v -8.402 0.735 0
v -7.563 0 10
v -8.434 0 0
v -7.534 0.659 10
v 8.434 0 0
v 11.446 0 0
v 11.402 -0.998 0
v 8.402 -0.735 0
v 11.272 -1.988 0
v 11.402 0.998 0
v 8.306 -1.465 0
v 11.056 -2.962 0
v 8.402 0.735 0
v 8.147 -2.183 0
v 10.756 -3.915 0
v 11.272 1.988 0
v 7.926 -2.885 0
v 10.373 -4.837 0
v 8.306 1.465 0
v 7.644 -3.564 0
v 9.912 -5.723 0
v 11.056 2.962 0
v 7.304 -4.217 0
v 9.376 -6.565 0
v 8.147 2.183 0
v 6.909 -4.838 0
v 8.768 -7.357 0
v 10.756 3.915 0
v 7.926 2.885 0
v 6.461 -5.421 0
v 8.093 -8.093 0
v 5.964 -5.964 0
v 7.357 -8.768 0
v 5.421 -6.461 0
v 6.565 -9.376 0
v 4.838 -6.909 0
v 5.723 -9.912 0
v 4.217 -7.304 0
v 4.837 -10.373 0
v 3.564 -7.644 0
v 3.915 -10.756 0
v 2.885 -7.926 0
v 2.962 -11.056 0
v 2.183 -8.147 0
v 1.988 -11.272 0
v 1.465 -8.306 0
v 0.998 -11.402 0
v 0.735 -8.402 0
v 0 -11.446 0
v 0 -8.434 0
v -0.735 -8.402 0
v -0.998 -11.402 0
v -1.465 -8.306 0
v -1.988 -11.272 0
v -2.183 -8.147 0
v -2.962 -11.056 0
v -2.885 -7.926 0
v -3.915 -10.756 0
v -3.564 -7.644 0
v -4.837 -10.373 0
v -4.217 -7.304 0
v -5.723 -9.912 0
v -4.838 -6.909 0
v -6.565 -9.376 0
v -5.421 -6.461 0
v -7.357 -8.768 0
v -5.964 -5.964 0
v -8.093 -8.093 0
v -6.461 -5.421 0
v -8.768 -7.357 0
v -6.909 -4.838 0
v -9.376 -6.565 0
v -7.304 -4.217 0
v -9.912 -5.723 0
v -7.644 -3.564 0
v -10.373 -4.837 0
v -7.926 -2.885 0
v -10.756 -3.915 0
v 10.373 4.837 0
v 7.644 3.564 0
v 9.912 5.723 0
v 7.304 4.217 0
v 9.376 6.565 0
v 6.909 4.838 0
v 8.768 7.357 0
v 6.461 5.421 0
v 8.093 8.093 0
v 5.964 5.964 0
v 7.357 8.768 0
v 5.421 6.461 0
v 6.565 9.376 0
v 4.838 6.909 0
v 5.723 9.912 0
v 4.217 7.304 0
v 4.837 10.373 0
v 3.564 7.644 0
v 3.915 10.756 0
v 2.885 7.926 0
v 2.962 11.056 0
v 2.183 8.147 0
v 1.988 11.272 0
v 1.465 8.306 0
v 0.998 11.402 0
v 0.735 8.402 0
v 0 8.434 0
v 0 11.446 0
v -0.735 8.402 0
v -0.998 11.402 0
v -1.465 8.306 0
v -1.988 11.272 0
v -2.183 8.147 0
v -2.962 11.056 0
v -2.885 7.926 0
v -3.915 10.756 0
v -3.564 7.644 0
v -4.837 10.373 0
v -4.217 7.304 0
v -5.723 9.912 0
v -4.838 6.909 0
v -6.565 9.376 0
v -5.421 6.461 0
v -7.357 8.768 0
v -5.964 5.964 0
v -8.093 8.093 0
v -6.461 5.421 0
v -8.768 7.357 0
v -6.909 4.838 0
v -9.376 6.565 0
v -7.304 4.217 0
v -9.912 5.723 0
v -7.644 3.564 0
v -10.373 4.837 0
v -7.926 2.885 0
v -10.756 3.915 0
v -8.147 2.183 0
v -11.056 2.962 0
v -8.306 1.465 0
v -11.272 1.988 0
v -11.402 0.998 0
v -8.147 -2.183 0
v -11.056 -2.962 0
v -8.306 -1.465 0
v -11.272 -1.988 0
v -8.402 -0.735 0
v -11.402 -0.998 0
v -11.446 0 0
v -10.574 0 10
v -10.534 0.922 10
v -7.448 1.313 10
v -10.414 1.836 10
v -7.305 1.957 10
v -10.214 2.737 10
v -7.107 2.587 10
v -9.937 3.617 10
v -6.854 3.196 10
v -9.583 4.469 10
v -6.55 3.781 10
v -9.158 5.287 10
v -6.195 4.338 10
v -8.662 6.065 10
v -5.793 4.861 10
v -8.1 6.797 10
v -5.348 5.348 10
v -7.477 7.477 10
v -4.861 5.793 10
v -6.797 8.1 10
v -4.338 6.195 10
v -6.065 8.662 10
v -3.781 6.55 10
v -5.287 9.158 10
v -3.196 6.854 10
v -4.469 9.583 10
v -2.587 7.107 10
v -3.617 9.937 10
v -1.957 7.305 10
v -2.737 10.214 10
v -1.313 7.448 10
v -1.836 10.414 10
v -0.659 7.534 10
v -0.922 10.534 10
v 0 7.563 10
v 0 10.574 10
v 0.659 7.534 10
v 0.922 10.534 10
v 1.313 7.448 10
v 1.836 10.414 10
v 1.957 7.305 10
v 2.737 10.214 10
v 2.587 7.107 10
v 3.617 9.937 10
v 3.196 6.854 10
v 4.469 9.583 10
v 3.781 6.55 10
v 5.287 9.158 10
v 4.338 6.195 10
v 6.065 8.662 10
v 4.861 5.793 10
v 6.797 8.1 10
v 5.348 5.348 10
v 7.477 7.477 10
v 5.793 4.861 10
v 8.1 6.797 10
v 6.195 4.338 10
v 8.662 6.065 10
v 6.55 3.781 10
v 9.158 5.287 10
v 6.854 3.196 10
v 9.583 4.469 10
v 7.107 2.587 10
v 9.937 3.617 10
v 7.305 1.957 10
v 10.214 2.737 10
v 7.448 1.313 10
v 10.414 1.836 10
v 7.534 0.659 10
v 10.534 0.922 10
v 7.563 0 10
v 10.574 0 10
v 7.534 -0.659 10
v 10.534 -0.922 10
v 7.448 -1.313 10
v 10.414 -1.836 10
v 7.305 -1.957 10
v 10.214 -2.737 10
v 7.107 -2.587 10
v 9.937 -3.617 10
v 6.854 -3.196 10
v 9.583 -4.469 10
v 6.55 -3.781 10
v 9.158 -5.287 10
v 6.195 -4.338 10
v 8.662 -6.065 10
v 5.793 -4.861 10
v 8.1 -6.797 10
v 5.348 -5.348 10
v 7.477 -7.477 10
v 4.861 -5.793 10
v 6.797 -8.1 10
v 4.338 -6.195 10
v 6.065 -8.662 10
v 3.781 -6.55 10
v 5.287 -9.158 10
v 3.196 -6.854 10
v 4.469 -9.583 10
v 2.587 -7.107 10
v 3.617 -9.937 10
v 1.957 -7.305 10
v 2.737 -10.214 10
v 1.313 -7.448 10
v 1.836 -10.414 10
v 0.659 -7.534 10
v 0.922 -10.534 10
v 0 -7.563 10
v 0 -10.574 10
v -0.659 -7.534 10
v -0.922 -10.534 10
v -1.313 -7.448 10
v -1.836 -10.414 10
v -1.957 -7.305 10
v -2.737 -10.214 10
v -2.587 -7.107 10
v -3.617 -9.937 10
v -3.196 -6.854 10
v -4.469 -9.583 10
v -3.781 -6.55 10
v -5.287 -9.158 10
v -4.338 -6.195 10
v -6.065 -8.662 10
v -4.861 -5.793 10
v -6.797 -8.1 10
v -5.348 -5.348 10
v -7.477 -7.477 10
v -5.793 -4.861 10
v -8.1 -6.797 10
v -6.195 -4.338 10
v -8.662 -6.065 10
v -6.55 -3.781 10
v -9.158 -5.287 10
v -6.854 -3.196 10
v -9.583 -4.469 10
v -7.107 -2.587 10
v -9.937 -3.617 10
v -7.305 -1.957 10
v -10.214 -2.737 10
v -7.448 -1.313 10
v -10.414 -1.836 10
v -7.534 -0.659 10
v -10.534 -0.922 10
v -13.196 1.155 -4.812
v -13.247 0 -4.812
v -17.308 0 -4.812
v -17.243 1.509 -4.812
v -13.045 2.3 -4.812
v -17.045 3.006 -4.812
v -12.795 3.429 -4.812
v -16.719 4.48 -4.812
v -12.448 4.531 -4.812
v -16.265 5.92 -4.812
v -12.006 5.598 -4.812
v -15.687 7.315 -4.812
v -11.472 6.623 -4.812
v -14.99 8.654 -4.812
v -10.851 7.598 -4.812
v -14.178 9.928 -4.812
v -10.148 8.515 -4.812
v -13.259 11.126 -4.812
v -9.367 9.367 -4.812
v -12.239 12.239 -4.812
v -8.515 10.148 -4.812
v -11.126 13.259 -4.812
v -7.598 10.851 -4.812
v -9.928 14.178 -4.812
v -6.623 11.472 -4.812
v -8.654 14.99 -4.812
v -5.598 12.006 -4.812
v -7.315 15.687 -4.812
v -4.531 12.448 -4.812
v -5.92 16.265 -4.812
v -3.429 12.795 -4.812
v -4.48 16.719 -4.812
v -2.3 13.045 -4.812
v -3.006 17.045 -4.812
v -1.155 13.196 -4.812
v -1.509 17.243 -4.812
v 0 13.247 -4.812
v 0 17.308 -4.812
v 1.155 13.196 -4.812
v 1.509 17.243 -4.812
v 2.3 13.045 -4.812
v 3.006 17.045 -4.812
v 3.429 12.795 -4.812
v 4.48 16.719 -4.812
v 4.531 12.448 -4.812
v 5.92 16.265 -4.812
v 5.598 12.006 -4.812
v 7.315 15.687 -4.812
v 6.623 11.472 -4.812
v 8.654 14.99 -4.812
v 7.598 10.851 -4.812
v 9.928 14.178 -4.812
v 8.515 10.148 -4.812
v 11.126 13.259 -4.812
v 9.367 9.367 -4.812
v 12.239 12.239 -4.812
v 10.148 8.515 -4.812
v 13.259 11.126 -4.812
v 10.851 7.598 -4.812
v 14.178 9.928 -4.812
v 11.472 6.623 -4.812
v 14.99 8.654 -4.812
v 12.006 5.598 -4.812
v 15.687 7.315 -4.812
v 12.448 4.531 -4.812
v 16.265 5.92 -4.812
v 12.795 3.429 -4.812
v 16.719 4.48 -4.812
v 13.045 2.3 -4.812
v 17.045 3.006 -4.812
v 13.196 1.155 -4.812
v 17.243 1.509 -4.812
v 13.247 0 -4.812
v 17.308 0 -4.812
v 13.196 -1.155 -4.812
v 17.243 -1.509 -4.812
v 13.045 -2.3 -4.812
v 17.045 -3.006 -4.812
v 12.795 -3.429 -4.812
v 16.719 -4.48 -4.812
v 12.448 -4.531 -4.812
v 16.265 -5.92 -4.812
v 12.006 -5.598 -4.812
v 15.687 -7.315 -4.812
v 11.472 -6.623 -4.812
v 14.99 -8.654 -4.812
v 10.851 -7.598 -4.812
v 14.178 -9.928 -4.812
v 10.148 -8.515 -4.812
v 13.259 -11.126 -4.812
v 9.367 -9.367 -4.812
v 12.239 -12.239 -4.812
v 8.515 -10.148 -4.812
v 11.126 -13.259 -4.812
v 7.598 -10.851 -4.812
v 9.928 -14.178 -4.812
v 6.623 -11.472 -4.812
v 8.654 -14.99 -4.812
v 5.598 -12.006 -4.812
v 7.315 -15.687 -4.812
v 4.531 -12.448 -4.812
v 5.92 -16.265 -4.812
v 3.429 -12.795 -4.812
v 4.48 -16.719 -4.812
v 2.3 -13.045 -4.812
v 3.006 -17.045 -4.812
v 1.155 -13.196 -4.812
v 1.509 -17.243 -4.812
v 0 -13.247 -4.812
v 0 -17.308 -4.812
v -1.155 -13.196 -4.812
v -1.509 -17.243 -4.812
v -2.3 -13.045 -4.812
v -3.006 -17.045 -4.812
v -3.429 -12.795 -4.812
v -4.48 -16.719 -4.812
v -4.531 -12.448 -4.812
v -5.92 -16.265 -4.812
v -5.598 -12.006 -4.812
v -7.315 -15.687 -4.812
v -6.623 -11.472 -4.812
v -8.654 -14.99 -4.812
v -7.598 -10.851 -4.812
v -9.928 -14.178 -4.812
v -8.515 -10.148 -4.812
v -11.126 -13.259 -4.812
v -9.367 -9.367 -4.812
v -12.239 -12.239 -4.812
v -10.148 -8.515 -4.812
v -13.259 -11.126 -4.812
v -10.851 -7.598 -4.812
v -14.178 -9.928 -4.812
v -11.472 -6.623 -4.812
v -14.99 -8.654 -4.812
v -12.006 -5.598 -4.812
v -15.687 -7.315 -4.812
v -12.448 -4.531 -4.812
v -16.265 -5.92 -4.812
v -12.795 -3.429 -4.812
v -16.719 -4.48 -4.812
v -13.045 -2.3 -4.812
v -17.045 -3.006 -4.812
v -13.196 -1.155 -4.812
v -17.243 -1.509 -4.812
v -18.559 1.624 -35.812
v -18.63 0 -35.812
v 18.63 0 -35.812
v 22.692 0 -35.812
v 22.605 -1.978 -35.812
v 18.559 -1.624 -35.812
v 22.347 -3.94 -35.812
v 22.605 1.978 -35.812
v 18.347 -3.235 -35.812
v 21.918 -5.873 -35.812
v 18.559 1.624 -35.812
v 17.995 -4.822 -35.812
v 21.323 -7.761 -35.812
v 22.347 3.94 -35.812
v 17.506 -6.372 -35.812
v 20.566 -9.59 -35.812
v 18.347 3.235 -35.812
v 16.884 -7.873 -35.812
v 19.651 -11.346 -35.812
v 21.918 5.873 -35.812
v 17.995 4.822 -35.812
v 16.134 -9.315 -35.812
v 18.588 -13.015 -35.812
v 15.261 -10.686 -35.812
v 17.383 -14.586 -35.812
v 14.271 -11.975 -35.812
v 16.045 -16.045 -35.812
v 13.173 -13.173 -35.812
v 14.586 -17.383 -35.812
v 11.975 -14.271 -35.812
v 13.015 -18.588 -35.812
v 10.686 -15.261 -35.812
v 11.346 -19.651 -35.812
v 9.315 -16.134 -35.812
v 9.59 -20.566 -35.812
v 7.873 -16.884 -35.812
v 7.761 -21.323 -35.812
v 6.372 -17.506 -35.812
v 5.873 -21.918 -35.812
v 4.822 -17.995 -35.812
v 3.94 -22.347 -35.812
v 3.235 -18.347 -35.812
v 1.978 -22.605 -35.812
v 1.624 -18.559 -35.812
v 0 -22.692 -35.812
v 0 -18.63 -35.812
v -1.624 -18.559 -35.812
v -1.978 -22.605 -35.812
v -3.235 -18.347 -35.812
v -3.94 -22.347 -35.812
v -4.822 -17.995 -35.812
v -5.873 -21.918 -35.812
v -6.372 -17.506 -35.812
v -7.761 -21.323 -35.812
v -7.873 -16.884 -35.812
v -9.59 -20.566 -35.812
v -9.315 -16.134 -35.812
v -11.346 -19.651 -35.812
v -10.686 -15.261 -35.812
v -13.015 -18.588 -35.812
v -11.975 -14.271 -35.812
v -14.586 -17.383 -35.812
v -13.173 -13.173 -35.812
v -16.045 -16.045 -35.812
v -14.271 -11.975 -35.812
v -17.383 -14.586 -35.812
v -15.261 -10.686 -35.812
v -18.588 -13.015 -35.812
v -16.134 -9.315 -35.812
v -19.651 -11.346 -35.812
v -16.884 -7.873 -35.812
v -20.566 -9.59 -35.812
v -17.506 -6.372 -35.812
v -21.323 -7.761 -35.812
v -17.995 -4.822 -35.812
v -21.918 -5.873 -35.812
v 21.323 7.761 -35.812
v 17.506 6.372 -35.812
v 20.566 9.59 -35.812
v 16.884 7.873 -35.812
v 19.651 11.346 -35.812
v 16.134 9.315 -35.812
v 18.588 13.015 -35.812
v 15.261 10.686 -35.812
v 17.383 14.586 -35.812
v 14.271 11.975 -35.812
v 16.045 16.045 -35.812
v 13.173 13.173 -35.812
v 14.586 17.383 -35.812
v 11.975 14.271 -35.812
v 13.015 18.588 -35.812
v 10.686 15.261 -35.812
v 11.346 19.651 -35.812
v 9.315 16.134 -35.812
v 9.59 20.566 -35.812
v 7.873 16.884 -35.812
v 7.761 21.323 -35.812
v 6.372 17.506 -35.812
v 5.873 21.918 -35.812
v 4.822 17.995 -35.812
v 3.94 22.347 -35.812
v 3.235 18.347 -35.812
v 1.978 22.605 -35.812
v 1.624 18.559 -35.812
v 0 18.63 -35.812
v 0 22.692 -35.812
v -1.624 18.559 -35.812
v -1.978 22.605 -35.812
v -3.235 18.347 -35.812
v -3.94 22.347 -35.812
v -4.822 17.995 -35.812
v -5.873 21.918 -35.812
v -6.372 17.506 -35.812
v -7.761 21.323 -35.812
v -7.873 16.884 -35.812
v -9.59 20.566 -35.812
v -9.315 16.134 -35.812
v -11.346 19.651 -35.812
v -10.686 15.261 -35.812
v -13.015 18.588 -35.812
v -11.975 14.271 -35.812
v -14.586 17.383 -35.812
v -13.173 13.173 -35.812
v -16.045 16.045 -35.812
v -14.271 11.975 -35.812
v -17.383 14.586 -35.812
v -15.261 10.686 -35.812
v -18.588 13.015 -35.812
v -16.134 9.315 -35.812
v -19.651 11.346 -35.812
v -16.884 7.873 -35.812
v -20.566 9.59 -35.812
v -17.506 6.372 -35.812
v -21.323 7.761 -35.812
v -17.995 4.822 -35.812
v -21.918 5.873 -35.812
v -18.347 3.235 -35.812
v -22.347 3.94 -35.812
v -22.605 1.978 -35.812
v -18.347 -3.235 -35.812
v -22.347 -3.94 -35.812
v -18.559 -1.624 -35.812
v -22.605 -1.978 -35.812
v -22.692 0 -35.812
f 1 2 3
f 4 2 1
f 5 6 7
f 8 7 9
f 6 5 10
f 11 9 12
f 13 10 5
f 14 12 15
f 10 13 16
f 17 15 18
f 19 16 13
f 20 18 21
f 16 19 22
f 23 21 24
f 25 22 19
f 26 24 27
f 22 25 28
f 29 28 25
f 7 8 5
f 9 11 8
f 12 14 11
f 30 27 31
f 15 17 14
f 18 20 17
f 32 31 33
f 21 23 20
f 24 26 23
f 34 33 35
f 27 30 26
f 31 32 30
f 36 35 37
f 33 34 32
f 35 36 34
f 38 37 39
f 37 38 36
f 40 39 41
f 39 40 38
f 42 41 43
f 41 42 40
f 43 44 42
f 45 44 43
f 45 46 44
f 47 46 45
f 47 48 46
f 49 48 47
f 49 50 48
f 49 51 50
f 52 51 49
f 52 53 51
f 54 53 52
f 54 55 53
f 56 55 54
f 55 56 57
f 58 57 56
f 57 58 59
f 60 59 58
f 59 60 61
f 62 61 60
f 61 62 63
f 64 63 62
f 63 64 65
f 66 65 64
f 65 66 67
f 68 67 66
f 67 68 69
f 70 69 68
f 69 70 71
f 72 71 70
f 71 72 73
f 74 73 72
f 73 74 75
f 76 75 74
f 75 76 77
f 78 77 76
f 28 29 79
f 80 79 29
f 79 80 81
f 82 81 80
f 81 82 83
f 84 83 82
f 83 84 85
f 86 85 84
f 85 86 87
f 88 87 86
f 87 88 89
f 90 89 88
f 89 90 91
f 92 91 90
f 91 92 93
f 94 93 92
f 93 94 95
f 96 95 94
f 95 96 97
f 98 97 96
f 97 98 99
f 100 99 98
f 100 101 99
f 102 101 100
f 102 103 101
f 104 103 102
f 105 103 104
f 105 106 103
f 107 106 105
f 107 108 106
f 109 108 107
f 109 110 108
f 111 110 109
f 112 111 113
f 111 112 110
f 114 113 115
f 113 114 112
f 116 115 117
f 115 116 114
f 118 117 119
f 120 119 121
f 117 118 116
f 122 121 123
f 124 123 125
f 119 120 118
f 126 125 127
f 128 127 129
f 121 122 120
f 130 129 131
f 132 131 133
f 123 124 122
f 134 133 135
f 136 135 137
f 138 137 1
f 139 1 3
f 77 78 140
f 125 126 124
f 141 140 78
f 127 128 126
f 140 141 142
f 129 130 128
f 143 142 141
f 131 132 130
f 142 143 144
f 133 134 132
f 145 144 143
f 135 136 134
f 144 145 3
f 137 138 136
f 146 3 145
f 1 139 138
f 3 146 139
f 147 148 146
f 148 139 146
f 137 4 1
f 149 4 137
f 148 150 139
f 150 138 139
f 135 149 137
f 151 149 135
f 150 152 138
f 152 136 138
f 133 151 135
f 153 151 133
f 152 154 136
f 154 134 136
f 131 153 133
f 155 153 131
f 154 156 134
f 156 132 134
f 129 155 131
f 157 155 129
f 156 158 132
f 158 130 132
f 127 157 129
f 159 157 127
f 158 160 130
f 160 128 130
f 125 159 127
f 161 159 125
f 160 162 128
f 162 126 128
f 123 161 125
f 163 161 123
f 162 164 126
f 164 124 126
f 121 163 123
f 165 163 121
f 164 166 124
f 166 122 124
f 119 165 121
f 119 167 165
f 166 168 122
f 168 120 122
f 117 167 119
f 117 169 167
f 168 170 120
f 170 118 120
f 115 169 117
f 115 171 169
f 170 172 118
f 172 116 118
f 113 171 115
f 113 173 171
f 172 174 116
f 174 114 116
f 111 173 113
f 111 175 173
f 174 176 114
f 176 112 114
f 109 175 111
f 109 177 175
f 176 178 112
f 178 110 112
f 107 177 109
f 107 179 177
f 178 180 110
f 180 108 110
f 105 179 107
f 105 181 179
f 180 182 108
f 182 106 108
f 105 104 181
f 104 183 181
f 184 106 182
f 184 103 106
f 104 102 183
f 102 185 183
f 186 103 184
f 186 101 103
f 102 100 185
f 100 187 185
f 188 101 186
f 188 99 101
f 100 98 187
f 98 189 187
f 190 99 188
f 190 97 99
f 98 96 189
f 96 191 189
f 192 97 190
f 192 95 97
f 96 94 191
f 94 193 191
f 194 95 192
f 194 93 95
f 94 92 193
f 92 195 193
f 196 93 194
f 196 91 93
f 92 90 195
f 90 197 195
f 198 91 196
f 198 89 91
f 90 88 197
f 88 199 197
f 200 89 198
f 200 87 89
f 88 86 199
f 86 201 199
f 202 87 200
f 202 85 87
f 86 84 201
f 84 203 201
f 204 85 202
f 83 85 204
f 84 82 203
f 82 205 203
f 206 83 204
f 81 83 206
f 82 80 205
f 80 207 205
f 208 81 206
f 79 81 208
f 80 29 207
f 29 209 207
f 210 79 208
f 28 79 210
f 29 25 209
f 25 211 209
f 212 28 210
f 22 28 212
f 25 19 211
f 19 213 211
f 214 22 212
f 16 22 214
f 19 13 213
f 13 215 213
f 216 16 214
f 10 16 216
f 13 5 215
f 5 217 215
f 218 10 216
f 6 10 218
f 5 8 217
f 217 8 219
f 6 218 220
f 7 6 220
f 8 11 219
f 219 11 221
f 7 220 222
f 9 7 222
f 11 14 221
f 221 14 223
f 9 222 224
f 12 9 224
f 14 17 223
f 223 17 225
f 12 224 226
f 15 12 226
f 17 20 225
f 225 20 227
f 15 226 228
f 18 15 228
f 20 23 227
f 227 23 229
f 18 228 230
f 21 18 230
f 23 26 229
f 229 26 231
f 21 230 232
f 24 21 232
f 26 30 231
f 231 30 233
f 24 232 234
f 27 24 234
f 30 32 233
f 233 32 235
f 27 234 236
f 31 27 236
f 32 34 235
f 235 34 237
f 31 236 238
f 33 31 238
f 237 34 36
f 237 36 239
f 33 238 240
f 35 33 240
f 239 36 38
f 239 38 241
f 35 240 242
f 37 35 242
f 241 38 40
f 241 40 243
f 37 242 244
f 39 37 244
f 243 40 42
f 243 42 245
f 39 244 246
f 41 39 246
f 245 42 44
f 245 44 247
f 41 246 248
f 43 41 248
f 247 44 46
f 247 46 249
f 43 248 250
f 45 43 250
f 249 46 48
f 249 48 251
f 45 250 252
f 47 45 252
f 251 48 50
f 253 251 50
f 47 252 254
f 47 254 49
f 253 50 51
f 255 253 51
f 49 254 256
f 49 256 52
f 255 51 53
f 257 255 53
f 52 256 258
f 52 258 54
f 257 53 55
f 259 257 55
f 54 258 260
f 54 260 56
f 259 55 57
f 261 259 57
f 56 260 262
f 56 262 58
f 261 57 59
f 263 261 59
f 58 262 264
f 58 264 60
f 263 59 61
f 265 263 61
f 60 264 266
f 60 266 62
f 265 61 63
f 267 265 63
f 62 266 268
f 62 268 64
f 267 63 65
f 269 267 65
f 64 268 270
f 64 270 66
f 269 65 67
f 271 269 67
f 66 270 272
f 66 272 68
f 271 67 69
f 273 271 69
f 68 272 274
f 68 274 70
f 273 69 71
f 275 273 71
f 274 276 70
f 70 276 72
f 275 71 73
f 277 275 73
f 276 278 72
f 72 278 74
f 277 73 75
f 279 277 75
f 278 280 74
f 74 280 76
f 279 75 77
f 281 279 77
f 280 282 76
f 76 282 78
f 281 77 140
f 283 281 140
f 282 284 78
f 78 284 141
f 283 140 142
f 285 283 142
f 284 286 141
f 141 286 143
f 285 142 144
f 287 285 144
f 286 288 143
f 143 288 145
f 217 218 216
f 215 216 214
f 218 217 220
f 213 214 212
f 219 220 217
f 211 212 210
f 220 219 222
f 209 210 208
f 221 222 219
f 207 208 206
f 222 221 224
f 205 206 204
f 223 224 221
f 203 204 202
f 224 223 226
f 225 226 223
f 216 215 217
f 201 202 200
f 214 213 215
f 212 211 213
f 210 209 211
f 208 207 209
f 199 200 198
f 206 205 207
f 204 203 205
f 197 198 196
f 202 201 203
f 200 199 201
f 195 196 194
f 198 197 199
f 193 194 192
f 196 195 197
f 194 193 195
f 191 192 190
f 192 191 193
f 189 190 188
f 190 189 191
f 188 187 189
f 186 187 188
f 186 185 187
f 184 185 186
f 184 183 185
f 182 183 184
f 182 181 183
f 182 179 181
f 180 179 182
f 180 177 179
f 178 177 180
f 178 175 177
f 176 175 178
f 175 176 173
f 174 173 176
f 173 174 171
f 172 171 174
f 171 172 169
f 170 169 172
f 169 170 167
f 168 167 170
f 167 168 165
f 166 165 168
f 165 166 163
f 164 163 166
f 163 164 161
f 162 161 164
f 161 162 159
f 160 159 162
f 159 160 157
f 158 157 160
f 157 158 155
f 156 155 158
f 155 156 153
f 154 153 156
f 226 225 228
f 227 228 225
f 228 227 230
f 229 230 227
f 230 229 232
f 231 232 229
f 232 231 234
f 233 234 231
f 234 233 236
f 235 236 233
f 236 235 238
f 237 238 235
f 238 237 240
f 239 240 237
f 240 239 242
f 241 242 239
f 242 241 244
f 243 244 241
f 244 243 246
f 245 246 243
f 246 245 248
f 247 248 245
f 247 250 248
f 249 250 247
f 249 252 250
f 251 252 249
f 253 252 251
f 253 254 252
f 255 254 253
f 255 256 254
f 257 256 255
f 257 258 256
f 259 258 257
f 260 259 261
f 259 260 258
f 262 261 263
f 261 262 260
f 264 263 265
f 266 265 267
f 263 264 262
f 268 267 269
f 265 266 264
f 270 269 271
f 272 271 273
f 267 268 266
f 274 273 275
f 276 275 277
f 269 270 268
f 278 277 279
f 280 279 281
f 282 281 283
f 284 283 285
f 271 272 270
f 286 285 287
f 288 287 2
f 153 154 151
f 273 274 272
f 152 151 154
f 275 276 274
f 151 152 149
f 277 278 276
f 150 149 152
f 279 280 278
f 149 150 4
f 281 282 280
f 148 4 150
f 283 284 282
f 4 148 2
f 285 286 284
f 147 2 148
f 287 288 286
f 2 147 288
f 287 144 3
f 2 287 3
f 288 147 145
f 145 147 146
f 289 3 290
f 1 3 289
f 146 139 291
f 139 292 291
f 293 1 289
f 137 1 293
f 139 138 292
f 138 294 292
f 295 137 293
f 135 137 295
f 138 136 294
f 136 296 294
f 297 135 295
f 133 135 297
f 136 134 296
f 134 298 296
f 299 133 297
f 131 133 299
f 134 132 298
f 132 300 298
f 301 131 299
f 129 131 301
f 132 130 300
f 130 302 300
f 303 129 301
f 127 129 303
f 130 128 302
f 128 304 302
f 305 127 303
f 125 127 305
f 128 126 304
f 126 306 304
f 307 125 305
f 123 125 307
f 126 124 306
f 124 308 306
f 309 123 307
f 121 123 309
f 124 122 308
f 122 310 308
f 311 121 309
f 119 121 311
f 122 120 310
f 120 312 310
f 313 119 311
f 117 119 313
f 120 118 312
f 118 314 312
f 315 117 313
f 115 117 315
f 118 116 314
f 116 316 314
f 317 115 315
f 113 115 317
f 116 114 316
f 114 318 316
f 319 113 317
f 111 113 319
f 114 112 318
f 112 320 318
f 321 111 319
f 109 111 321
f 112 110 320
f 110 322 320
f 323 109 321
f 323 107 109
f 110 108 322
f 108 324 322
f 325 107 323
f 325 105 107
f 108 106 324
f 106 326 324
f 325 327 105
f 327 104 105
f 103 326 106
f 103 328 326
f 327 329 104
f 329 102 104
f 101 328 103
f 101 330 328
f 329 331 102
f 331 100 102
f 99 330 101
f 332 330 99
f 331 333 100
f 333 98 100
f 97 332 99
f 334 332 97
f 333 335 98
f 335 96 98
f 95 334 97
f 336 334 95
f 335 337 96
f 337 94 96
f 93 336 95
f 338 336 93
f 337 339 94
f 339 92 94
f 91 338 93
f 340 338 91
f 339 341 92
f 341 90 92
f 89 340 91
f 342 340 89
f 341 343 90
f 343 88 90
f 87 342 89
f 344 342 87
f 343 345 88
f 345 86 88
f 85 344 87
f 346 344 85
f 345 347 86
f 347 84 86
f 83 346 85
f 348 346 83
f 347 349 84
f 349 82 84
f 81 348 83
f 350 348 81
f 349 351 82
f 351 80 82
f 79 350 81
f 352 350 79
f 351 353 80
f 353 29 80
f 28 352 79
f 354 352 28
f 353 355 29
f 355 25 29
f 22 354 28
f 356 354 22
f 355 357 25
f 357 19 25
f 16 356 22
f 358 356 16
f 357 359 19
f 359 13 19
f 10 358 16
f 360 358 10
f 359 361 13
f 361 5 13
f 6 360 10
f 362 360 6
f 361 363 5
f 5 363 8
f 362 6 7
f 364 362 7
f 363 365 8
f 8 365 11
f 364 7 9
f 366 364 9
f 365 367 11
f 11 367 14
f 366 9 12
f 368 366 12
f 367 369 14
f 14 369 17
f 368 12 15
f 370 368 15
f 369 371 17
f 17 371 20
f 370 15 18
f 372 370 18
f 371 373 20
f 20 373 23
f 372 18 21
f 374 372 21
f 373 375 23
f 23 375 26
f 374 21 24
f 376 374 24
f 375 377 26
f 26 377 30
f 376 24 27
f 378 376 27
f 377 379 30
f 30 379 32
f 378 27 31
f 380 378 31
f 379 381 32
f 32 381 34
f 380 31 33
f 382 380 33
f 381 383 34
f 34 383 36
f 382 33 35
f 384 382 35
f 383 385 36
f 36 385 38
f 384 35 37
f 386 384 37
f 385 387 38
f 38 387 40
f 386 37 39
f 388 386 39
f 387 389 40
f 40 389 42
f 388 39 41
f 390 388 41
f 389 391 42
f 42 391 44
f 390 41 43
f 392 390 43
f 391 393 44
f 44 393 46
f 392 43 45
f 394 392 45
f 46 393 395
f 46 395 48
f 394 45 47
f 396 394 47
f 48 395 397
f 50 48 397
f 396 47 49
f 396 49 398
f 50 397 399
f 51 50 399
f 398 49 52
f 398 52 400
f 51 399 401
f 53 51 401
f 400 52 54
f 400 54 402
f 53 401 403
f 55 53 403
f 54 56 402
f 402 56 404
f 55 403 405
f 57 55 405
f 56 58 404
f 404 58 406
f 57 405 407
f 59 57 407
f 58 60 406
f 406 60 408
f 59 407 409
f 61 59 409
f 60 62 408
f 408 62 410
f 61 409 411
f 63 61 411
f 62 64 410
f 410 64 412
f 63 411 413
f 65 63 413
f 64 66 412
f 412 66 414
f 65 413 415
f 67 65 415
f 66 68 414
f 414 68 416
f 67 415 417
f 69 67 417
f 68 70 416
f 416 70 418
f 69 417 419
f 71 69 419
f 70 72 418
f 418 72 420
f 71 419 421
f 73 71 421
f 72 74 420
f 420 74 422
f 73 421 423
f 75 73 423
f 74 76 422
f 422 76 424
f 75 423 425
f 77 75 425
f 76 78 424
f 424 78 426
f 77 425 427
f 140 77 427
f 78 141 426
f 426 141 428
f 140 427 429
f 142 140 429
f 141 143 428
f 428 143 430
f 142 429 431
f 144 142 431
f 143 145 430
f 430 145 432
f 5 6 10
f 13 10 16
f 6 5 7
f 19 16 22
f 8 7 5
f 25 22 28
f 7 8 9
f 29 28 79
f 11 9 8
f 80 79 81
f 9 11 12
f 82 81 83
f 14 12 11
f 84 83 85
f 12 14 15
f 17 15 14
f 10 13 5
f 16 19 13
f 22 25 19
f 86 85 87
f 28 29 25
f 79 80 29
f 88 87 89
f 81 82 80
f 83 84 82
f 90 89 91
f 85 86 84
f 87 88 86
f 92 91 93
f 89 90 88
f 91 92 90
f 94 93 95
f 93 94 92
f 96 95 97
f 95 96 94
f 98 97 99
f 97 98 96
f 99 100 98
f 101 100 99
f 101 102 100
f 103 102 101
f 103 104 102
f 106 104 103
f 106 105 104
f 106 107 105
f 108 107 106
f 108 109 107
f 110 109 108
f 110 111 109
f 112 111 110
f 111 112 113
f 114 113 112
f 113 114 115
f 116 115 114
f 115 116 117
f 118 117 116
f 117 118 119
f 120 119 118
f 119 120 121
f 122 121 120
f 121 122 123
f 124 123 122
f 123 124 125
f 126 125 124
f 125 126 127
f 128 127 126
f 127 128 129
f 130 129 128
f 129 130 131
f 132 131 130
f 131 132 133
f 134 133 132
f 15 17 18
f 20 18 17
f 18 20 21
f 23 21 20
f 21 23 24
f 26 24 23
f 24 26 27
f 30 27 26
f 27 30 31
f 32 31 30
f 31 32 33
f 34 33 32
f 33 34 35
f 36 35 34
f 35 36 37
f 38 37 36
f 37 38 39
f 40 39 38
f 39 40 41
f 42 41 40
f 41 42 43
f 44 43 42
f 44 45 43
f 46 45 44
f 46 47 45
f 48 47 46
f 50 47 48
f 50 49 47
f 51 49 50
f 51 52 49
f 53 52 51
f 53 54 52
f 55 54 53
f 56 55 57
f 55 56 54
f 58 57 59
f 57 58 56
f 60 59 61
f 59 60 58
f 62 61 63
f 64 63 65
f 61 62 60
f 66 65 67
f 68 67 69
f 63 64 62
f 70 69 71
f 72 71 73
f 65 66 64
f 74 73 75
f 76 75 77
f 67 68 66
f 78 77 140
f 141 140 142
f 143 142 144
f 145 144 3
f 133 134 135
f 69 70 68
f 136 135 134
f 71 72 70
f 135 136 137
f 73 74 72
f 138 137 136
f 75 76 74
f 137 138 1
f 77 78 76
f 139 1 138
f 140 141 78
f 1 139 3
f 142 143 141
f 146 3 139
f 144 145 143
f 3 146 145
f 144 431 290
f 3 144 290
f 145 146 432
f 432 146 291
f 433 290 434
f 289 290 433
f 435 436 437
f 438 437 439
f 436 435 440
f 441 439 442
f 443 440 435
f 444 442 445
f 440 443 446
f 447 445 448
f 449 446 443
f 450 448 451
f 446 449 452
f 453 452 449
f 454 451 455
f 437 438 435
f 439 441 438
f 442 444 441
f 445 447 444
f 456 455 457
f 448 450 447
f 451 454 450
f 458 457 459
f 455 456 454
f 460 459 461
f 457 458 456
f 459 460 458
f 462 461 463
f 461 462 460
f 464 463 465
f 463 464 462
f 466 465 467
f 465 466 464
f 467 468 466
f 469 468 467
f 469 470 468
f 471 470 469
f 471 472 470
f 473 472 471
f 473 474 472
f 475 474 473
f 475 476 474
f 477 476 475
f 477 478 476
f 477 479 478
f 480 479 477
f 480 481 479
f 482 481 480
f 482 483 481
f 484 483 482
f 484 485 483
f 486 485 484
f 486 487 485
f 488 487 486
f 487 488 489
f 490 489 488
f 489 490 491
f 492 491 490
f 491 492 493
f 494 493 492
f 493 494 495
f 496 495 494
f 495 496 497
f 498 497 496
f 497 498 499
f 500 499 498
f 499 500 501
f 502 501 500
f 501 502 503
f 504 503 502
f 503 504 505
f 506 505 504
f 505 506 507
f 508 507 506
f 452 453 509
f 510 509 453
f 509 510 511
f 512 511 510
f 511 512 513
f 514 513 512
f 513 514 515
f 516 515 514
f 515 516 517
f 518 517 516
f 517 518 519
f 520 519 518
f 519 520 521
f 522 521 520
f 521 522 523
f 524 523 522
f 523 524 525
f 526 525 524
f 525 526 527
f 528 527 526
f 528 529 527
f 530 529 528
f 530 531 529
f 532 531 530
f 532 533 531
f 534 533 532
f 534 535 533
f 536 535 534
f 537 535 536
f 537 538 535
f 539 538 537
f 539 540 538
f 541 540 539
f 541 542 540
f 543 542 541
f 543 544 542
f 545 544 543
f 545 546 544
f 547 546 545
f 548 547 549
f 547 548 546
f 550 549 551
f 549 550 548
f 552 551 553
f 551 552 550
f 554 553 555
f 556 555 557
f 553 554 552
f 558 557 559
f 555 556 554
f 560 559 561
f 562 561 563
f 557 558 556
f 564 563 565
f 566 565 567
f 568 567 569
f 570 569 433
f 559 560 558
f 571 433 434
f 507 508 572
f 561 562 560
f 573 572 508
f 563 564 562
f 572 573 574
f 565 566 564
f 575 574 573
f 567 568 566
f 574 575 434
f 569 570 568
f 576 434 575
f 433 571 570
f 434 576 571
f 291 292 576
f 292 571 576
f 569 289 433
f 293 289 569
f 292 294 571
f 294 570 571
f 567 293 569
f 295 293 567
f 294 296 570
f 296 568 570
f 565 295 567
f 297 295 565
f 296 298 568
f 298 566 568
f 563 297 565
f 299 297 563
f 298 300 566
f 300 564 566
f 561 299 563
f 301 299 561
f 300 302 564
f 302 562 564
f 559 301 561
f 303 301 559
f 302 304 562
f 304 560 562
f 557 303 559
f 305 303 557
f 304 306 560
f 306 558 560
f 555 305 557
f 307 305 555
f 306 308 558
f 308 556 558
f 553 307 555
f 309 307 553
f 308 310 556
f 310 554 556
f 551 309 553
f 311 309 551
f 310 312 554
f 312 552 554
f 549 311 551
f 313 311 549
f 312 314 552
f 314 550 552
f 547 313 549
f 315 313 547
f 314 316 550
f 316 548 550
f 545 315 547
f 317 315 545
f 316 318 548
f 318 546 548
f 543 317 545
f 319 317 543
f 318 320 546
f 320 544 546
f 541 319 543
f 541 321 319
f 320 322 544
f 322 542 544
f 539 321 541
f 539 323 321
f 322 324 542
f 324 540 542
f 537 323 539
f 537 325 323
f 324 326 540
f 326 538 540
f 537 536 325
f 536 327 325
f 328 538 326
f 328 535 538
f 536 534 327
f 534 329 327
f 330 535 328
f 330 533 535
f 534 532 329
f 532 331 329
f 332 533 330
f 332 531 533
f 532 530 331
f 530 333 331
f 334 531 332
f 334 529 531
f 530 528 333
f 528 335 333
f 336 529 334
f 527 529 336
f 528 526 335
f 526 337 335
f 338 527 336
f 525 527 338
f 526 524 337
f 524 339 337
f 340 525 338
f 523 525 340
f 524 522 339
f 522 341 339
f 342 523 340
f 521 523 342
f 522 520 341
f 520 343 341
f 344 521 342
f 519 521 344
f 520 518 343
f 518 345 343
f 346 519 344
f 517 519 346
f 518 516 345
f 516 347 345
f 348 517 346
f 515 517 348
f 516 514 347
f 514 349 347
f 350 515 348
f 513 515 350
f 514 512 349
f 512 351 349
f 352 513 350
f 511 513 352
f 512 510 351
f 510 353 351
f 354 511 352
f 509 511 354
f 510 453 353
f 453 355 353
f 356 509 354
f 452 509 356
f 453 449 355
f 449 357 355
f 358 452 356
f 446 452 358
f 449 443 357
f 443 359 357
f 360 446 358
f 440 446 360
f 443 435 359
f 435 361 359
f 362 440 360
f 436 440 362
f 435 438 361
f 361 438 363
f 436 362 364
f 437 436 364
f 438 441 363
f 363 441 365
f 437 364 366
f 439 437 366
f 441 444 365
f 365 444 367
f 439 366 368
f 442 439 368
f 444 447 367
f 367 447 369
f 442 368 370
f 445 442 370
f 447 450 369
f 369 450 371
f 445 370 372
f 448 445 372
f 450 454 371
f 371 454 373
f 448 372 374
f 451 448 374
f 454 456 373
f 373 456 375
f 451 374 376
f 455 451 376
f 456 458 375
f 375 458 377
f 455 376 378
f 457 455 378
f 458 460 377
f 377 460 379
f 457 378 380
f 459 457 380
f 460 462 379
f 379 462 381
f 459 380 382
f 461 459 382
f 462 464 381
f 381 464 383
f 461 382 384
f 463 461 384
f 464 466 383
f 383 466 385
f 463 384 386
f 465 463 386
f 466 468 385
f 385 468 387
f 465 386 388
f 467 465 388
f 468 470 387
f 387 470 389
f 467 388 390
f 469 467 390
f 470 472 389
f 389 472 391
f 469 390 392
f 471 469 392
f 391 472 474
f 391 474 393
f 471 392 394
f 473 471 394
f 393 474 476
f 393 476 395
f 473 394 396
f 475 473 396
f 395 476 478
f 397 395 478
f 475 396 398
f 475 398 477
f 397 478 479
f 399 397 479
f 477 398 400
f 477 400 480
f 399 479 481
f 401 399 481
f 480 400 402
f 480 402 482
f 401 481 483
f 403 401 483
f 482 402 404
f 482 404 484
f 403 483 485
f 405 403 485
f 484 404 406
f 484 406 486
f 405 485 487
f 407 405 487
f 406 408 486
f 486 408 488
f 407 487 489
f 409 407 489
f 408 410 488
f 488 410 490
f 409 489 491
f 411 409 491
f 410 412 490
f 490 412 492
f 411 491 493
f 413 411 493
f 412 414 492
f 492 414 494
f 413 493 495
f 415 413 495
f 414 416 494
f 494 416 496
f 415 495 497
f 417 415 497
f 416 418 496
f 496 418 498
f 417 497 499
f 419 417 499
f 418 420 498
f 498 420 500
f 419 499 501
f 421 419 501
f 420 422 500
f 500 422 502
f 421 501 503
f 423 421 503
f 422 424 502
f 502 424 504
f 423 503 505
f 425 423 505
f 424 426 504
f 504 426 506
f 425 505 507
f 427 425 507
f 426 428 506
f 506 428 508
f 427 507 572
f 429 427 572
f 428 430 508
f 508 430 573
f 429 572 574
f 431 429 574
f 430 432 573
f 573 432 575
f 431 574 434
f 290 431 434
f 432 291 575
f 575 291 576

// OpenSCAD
// pipe adapter
// @author Ilya Protasov

/*
TODO
Measurements visual
minimal middle thick
show text error for sizes
? rim
*/

/* [Simple] */
// if unchecked sizes will be for inner diameter
offset_A = "out";// [in, center, out]
// height of part A
height_A = 10.00;// [0.2:0.01:100]
// diameter at center of height the part A
diameter_A = 22.02; // [0.2:0.01:100]
// wall thickness
thick_A = 3.00;// [0.1:0.01:50]
// negative angle for outside pipe
angle_A = 5;// [-90:0.1:90]


offset_B = "out";// [in, center, out]
height_B = 31; // [0.2:0.01:100]
diameter_B = 40; // [0.2:0.01:100]

thick_B = 4; // [0.1:0.01:50]
angle_B = 10;// [-90:0.1:90]

// angle for inner surface that joins A and B parts
innerAngleM = 45;// [-90:0.1:89]
/* [Advanced] */

/* [Quality] */
$fn = 72;


/* [Debug] */
cutaway = false;
cut_angle = 180; // [1:1:359]
// TODO fix
show_diameters = false;
//TODO show_sizes = false;

function pipePoints(thick, angle, radius, height, offset) =
    // check let in Thingerverse
    let (
        thickProj = thick / cos(angle),
        // get offset for x axis
        xAOffset = offset == "in" ? 0 :
               (offset == "center" ? -thickProj / 2 : - thickProj),
        xATopOffset = height / 2 * sin(angle)
        )
    [
    // anticlockwise: bottom
    [radius + xAOffset + xATopOffset, 0], [radius + xAOffset + xATopOffset + thickProj, 0],
    // top
    [radius + xAOffset + thickProj - xATopOffset, height],
    [radius + xAOffset - xATopOffset, height]
    ];

module middle(topInX, topOutX, bottomInX, bottomOutX, height) {
    rotateAngle = cutaway ? cut_angle : 360;
    rotate_extrude(angle = rotateAngle)
        polygon( points=[
            // anticlockwise: bottom
            [bottomInX, 0], [bottomOutX, 0],
            // top
            [topOutX, height],
            [topInX, height]] );
}

module rotatedPoints(points) {
    rotateAngle = cutaway ? cut_angle : 360;
    rotate_extrude(angle = rotateAngle)
        polygon( points );
}

module adapter(i) {
    //4/Math.cos(30*Math.PI/180)
    thickAProj = thick_A / cos(angle_A);
    //echo(thickAProj);
    thickH = thick_A * sin(angle_A);
    //echo(thickH);
    // get offset for x axis
    xAOffset = offset_A == "in" ? 0 :
               (offset_A == "center" ? -thickAProj / 2 : -thickAProj);
    //echo(xAOffset);

    // A part
    pipePointsA = pipePoints(
        height = height_A,
        radius = diameter_A / 2,
        thick=thick_A,
        offset = offset_A,
        angle=angle_A);
    rotatedPoints(points = pipePointsA);
    if (show_diameters)
        color("yellow", .3)
            cylinder(h = height_A, r = diameter_A / 2);

    // B part only points (needs for Middel part
    pipePointsB = pipePoints(
        height = height_B,
        radius = diameter_B / 2,
        thick=thick_B,
        offset = offset_B,
        angle=angle_B);

    // Middle part
    // TODO minimal middle thick
    innerDeltaXAB = pipePointsB[3][0] - pipePointsA[0][0];
    //heightM = innerDeltaXAB / cos(innerAngleM);
    heightM = abs(innerDeltaXAB) * tan(innerAngleM);
    pipePointsMiddle=[
            // anticlockwise: bottom
            [pipePointsB[3][0], 0],
            [pipePointsB[2][0], 0],
            // top
            [pipePointsA[1][0], heightM],
            [pipePointsA[0][0], heightM]];
    translate([0,0, -heightM])
    color("forestgreen")
        // TODO get params
        //middle(topInX=7, topOutX=10, bottomInX=14, bottomOutX=20, height=heightM);
        rotatedPoints(points = pipePointsMiddle);
        //rotatedPoints(points = pipePointsA);

    // B side here because heightM needs to be calulated
    translate([0,0, -heightM-height_B])
        rotatedPoints(points = pipePointsB);
}

adapter();
